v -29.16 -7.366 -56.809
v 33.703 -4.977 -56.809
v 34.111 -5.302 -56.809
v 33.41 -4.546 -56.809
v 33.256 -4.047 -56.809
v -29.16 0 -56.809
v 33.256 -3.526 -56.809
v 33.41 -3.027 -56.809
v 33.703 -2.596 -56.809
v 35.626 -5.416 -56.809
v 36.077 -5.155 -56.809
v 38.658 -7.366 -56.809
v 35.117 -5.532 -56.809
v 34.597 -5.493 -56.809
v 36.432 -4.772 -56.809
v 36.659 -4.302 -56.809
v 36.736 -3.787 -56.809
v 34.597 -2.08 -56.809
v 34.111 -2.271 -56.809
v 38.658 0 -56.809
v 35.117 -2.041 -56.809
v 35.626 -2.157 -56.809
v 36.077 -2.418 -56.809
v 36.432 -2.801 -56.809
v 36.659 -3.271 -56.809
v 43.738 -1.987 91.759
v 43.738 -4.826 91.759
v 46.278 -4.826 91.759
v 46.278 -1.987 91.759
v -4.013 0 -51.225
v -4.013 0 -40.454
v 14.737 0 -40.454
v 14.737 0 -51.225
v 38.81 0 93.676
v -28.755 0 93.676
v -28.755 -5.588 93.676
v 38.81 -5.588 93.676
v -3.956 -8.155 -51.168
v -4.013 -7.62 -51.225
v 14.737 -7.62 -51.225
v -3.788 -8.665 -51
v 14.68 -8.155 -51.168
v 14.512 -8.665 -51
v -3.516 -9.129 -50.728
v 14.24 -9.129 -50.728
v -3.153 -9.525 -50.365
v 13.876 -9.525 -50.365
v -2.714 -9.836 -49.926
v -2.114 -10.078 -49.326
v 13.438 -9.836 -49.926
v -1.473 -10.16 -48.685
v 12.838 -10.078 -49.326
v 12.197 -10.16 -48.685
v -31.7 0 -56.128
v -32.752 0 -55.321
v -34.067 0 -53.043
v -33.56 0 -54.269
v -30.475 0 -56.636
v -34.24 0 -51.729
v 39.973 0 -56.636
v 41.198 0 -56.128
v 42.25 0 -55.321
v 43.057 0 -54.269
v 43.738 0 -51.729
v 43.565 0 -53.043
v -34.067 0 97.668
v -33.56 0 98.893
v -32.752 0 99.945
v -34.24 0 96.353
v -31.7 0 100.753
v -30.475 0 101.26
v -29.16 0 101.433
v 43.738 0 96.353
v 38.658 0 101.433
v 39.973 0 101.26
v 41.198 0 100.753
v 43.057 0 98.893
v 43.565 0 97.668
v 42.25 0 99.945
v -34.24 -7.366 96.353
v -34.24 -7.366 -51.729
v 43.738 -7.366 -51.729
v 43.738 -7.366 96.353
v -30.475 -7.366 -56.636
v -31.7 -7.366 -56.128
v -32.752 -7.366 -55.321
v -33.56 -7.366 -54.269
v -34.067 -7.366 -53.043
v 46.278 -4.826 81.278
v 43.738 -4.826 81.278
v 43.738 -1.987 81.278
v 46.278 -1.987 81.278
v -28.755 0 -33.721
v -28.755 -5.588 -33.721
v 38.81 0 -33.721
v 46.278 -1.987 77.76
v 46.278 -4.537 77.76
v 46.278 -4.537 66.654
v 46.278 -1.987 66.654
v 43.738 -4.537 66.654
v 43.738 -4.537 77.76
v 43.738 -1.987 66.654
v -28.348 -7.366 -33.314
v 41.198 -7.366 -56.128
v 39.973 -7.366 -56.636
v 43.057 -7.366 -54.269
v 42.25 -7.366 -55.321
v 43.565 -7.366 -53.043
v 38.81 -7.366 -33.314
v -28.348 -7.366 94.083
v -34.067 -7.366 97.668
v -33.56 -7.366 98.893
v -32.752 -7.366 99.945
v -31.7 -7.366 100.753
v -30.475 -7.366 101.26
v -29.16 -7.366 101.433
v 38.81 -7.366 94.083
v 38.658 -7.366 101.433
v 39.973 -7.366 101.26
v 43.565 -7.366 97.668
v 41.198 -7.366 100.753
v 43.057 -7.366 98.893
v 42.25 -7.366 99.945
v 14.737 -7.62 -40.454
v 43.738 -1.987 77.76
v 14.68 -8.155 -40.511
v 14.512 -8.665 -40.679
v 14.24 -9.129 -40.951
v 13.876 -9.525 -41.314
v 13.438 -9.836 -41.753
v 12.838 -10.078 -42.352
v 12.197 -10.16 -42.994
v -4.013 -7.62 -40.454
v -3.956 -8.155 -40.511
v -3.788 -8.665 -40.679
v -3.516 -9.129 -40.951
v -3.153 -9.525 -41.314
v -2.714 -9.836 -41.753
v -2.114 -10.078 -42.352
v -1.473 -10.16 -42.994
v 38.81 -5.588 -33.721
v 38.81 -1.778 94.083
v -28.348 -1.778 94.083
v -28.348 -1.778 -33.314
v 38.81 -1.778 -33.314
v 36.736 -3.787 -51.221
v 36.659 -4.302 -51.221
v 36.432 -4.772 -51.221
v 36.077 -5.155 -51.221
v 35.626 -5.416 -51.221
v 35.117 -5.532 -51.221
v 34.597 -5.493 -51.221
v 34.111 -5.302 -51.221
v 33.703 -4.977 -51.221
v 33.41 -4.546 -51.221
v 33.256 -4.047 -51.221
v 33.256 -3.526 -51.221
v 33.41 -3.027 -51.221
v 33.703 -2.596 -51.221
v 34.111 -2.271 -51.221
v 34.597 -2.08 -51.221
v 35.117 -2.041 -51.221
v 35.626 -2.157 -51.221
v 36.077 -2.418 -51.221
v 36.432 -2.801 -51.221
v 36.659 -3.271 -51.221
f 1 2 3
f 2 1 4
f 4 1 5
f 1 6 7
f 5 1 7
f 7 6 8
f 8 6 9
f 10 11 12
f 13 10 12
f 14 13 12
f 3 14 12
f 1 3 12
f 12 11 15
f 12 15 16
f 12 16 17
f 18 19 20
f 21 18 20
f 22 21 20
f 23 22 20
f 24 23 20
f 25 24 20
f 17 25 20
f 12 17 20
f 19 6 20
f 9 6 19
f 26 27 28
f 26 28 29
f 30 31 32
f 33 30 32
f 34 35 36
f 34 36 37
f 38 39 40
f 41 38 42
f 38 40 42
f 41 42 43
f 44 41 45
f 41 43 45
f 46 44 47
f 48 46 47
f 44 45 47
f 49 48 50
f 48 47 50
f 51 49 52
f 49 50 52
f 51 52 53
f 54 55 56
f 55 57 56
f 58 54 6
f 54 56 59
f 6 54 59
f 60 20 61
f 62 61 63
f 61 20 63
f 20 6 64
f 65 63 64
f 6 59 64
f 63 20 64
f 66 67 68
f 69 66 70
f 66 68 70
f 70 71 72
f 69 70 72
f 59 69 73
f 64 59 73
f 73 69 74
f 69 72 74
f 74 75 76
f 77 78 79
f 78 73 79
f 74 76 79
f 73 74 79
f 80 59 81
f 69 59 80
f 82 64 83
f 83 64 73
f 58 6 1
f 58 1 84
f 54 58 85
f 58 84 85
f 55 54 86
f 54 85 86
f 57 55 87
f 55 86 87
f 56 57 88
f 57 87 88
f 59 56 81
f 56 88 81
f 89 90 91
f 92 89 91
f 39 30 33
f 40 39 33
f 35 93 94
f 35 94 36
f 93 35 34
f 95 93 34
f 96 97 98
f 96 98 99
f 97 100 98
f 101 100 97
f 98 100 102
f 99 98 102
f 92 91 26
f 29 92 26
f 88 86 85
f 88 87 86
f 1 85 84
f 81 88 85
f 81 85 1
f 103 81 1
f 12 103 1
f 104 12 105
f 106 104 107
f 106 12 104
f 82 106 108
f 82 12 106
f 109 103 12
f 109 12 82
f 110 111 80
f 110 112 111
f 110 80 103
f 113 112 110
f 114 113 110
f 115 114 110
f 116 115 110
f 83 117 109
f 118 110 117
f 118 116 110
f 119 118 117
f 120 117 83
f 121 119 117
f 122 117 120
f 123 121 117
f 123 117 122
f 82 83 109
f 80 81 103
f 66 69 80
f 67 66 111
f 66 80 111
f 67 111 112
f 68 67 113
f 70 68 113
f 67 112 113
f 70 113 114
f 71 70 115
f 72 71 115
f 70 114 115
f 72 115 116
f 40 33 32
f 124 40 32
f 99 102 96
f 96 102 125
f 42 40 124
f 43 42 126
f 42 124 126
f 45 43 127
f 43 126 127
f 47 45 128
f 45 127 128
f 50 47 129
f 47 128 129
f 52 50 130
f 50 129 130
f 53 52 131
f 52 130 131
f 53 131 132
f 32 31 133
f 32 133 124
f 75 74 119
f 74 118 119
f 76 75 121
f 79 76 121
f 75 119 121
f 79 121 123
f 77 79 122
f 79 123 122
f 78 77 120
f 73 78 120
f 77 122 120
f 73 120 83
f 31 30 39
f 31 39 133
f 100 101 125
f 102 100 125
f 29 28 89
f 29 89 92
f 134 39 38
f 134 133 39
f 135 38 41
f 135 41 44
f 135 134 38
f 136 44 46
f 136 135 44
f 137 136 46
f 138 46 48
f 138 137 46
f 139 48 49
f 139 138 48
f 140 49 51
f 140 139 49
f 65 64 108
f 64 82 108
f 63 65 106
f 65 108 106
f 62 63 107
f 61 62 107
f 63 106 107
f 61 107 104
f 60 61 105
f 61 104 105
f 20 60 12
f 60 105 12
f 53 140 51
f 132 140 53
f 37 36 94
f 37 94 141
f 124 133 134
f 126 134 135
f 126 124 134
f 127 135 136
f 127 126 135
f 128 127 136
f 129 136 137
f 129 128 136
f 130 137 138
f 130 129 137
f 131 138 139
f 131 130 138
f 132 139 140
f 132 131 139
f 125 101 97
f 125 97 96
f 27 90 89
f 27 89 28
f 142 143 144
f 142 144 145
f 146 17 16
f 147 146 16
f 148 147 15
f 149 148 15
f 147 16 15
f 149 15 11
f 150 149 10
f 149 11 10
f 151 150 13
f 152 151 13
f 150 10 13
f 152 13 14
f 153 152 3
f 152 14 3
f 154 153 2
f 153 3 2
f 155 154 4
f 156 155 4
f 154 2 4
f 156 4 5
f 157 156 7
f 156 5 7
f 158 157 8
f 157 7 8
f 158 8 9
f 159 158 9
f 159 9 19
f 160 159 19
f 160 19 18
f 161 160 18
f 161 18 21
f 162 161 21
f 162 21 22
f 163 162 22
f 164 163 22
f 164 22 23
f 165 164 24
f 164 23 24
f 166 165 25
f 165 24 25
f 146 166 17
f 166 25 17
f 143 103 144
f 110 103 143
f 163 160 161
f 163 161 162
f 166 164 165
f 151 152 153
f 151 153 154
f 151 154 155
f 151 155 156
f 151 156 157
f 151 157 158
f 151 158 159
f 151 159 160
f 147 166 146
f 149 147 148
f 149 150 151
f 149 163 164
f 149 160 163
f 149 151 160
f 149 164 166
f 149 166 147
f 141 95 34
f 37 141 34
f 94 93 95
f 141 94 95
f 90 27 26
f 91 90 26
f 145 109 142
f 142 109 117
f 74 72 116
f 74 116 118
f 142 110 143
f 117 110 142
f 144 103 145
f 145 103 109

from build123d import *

# Parameters (mm, degrees)
F0_W      = 77.978
F0_H      = 158.242
F1_DEPTH  = 7.366
F2_W      = 67.158103
F2_H      = 127.396881
F3_DEPTH  = 5.588
F4_W      = 67.56512
F4_H      = 127.396889
F5_DEPTH  = 5.588
F6_R      = 5.08
F7_R      = 5.08
F8_R      = 5.08
F9_R      = 5.08
F10_R     = 1.75
F11_DEPTH = 5.588
F12_W     = 2.839187
F12_H     = 10.481581
F12_W_2   = 2.550296
F12_H_2   = 11.106588
F13_DEPTH = 2.54
F14_W     = 18.749708
F14_H     = 10.771107
F15_DEPTH = 10.16
F16_R     = 2.54


with BuildPart() as f1:
    # F0 (on Front) → F1 (new body)
    with BuildSketch(Plane.XZ):
        with Locations((4.748793, 22.312367)):
            Rectangle(F0_W, F0_H)
    extrude(amount=F1_DEPTH)

    # F2 (on face) → F3 (cut)
    with BuildSketch(Plane.XZ.offset(7.366)):
        with Locations((5.230792, 30.384123)):
            Rectangle(F2_W, F2_H)
    extrude(amount=-F3_DEPTH, mode=Mode.SUBTRACT)

    # F6
    f6_edges = [f1.edges().sort_by_distance(p)[0] for p in [
        (-34.240207, -3.683, 101.433367),
    ]]
    fillet(f6_edges, radius=F6_R)

    # F7
    f7_edges = [f1.edges().sort_by_distance(p)[0] for p in [
        (43.737793, -3.683, 101.433367),
    ]]
    fillet(f7_edges, radius=F7_R)

    # F8
    f8_edges = [f1.edges().sort_by_distance(p)[0] for p in [
        (43.737793, -3.683, -56.808633),
    ]]
    fillet(f8_edges, radius=F8_R)

    # F9
    f9_edges = [f1.edges().sort_by_distance(p)[0] for p in [
        (-34.240207, -3.683, -56.808633),
    ]]
    fillet(f9_edges, radius=F9_R)

    # F10 (on face) → F11 (cut)
    with BuildSketch(Plane(origin=(0, 0, -56.808633), x_dir=(1, 0, 0), z_dir=(0, 0, -1))):
        with Locations((34.986332, 3.786506)):
            Circle(F10_R)
    extrude(amount=-F11_DEPTH, mode=Mode.SUBTRACT)


with BuildPart() as f5:
    # F4 (on Front) → F5 (new body)
    with BuildSketch(Plane.XZ):
        with Locations((5.027283, 29.977109)):
            Rectangle(F4_W, F4_H)
    extrude(amount=F5_DEPTH)


with BuildPart() as f13:
    # F12 (on face) → F13 (new body)
    with BuildSketch(Plane.YZ.offset(43.737793)):
        with Locations((-3.406454, 86.518511)):
            Rectangle(F12_W, F12_H)
        with Locations((-3.262008, 72.206896)):
            Rectangle(F12_W_2, F12_H_2)
    extrude(amount=F13_DEPTH)


with BuildPart() as f15:
    # F14 (on Front) → F15 (new body)
    with BuildSketch(Plane.XZ):
        with Locations((5.361802, -45.839356)):
            Rectangle(F14_W, F14_H)
    extrude(amount=F15_DEPTH)

    # F16
    f16_edges = [f15.edges().sort_by_distance(p)[0] for p in [
        (5.361802, -10.16, -40.453803),
        (-4.013052, -10.16, -45.839356),
        (14.736656, -10.16, -45.839356),
        (5.361802, -10.16, -51.22491),
    ]]
    fillet(f16_edges, radius=F16_R)


solid = Compound([f1.part, f5.part, f13.part, f15.part])
